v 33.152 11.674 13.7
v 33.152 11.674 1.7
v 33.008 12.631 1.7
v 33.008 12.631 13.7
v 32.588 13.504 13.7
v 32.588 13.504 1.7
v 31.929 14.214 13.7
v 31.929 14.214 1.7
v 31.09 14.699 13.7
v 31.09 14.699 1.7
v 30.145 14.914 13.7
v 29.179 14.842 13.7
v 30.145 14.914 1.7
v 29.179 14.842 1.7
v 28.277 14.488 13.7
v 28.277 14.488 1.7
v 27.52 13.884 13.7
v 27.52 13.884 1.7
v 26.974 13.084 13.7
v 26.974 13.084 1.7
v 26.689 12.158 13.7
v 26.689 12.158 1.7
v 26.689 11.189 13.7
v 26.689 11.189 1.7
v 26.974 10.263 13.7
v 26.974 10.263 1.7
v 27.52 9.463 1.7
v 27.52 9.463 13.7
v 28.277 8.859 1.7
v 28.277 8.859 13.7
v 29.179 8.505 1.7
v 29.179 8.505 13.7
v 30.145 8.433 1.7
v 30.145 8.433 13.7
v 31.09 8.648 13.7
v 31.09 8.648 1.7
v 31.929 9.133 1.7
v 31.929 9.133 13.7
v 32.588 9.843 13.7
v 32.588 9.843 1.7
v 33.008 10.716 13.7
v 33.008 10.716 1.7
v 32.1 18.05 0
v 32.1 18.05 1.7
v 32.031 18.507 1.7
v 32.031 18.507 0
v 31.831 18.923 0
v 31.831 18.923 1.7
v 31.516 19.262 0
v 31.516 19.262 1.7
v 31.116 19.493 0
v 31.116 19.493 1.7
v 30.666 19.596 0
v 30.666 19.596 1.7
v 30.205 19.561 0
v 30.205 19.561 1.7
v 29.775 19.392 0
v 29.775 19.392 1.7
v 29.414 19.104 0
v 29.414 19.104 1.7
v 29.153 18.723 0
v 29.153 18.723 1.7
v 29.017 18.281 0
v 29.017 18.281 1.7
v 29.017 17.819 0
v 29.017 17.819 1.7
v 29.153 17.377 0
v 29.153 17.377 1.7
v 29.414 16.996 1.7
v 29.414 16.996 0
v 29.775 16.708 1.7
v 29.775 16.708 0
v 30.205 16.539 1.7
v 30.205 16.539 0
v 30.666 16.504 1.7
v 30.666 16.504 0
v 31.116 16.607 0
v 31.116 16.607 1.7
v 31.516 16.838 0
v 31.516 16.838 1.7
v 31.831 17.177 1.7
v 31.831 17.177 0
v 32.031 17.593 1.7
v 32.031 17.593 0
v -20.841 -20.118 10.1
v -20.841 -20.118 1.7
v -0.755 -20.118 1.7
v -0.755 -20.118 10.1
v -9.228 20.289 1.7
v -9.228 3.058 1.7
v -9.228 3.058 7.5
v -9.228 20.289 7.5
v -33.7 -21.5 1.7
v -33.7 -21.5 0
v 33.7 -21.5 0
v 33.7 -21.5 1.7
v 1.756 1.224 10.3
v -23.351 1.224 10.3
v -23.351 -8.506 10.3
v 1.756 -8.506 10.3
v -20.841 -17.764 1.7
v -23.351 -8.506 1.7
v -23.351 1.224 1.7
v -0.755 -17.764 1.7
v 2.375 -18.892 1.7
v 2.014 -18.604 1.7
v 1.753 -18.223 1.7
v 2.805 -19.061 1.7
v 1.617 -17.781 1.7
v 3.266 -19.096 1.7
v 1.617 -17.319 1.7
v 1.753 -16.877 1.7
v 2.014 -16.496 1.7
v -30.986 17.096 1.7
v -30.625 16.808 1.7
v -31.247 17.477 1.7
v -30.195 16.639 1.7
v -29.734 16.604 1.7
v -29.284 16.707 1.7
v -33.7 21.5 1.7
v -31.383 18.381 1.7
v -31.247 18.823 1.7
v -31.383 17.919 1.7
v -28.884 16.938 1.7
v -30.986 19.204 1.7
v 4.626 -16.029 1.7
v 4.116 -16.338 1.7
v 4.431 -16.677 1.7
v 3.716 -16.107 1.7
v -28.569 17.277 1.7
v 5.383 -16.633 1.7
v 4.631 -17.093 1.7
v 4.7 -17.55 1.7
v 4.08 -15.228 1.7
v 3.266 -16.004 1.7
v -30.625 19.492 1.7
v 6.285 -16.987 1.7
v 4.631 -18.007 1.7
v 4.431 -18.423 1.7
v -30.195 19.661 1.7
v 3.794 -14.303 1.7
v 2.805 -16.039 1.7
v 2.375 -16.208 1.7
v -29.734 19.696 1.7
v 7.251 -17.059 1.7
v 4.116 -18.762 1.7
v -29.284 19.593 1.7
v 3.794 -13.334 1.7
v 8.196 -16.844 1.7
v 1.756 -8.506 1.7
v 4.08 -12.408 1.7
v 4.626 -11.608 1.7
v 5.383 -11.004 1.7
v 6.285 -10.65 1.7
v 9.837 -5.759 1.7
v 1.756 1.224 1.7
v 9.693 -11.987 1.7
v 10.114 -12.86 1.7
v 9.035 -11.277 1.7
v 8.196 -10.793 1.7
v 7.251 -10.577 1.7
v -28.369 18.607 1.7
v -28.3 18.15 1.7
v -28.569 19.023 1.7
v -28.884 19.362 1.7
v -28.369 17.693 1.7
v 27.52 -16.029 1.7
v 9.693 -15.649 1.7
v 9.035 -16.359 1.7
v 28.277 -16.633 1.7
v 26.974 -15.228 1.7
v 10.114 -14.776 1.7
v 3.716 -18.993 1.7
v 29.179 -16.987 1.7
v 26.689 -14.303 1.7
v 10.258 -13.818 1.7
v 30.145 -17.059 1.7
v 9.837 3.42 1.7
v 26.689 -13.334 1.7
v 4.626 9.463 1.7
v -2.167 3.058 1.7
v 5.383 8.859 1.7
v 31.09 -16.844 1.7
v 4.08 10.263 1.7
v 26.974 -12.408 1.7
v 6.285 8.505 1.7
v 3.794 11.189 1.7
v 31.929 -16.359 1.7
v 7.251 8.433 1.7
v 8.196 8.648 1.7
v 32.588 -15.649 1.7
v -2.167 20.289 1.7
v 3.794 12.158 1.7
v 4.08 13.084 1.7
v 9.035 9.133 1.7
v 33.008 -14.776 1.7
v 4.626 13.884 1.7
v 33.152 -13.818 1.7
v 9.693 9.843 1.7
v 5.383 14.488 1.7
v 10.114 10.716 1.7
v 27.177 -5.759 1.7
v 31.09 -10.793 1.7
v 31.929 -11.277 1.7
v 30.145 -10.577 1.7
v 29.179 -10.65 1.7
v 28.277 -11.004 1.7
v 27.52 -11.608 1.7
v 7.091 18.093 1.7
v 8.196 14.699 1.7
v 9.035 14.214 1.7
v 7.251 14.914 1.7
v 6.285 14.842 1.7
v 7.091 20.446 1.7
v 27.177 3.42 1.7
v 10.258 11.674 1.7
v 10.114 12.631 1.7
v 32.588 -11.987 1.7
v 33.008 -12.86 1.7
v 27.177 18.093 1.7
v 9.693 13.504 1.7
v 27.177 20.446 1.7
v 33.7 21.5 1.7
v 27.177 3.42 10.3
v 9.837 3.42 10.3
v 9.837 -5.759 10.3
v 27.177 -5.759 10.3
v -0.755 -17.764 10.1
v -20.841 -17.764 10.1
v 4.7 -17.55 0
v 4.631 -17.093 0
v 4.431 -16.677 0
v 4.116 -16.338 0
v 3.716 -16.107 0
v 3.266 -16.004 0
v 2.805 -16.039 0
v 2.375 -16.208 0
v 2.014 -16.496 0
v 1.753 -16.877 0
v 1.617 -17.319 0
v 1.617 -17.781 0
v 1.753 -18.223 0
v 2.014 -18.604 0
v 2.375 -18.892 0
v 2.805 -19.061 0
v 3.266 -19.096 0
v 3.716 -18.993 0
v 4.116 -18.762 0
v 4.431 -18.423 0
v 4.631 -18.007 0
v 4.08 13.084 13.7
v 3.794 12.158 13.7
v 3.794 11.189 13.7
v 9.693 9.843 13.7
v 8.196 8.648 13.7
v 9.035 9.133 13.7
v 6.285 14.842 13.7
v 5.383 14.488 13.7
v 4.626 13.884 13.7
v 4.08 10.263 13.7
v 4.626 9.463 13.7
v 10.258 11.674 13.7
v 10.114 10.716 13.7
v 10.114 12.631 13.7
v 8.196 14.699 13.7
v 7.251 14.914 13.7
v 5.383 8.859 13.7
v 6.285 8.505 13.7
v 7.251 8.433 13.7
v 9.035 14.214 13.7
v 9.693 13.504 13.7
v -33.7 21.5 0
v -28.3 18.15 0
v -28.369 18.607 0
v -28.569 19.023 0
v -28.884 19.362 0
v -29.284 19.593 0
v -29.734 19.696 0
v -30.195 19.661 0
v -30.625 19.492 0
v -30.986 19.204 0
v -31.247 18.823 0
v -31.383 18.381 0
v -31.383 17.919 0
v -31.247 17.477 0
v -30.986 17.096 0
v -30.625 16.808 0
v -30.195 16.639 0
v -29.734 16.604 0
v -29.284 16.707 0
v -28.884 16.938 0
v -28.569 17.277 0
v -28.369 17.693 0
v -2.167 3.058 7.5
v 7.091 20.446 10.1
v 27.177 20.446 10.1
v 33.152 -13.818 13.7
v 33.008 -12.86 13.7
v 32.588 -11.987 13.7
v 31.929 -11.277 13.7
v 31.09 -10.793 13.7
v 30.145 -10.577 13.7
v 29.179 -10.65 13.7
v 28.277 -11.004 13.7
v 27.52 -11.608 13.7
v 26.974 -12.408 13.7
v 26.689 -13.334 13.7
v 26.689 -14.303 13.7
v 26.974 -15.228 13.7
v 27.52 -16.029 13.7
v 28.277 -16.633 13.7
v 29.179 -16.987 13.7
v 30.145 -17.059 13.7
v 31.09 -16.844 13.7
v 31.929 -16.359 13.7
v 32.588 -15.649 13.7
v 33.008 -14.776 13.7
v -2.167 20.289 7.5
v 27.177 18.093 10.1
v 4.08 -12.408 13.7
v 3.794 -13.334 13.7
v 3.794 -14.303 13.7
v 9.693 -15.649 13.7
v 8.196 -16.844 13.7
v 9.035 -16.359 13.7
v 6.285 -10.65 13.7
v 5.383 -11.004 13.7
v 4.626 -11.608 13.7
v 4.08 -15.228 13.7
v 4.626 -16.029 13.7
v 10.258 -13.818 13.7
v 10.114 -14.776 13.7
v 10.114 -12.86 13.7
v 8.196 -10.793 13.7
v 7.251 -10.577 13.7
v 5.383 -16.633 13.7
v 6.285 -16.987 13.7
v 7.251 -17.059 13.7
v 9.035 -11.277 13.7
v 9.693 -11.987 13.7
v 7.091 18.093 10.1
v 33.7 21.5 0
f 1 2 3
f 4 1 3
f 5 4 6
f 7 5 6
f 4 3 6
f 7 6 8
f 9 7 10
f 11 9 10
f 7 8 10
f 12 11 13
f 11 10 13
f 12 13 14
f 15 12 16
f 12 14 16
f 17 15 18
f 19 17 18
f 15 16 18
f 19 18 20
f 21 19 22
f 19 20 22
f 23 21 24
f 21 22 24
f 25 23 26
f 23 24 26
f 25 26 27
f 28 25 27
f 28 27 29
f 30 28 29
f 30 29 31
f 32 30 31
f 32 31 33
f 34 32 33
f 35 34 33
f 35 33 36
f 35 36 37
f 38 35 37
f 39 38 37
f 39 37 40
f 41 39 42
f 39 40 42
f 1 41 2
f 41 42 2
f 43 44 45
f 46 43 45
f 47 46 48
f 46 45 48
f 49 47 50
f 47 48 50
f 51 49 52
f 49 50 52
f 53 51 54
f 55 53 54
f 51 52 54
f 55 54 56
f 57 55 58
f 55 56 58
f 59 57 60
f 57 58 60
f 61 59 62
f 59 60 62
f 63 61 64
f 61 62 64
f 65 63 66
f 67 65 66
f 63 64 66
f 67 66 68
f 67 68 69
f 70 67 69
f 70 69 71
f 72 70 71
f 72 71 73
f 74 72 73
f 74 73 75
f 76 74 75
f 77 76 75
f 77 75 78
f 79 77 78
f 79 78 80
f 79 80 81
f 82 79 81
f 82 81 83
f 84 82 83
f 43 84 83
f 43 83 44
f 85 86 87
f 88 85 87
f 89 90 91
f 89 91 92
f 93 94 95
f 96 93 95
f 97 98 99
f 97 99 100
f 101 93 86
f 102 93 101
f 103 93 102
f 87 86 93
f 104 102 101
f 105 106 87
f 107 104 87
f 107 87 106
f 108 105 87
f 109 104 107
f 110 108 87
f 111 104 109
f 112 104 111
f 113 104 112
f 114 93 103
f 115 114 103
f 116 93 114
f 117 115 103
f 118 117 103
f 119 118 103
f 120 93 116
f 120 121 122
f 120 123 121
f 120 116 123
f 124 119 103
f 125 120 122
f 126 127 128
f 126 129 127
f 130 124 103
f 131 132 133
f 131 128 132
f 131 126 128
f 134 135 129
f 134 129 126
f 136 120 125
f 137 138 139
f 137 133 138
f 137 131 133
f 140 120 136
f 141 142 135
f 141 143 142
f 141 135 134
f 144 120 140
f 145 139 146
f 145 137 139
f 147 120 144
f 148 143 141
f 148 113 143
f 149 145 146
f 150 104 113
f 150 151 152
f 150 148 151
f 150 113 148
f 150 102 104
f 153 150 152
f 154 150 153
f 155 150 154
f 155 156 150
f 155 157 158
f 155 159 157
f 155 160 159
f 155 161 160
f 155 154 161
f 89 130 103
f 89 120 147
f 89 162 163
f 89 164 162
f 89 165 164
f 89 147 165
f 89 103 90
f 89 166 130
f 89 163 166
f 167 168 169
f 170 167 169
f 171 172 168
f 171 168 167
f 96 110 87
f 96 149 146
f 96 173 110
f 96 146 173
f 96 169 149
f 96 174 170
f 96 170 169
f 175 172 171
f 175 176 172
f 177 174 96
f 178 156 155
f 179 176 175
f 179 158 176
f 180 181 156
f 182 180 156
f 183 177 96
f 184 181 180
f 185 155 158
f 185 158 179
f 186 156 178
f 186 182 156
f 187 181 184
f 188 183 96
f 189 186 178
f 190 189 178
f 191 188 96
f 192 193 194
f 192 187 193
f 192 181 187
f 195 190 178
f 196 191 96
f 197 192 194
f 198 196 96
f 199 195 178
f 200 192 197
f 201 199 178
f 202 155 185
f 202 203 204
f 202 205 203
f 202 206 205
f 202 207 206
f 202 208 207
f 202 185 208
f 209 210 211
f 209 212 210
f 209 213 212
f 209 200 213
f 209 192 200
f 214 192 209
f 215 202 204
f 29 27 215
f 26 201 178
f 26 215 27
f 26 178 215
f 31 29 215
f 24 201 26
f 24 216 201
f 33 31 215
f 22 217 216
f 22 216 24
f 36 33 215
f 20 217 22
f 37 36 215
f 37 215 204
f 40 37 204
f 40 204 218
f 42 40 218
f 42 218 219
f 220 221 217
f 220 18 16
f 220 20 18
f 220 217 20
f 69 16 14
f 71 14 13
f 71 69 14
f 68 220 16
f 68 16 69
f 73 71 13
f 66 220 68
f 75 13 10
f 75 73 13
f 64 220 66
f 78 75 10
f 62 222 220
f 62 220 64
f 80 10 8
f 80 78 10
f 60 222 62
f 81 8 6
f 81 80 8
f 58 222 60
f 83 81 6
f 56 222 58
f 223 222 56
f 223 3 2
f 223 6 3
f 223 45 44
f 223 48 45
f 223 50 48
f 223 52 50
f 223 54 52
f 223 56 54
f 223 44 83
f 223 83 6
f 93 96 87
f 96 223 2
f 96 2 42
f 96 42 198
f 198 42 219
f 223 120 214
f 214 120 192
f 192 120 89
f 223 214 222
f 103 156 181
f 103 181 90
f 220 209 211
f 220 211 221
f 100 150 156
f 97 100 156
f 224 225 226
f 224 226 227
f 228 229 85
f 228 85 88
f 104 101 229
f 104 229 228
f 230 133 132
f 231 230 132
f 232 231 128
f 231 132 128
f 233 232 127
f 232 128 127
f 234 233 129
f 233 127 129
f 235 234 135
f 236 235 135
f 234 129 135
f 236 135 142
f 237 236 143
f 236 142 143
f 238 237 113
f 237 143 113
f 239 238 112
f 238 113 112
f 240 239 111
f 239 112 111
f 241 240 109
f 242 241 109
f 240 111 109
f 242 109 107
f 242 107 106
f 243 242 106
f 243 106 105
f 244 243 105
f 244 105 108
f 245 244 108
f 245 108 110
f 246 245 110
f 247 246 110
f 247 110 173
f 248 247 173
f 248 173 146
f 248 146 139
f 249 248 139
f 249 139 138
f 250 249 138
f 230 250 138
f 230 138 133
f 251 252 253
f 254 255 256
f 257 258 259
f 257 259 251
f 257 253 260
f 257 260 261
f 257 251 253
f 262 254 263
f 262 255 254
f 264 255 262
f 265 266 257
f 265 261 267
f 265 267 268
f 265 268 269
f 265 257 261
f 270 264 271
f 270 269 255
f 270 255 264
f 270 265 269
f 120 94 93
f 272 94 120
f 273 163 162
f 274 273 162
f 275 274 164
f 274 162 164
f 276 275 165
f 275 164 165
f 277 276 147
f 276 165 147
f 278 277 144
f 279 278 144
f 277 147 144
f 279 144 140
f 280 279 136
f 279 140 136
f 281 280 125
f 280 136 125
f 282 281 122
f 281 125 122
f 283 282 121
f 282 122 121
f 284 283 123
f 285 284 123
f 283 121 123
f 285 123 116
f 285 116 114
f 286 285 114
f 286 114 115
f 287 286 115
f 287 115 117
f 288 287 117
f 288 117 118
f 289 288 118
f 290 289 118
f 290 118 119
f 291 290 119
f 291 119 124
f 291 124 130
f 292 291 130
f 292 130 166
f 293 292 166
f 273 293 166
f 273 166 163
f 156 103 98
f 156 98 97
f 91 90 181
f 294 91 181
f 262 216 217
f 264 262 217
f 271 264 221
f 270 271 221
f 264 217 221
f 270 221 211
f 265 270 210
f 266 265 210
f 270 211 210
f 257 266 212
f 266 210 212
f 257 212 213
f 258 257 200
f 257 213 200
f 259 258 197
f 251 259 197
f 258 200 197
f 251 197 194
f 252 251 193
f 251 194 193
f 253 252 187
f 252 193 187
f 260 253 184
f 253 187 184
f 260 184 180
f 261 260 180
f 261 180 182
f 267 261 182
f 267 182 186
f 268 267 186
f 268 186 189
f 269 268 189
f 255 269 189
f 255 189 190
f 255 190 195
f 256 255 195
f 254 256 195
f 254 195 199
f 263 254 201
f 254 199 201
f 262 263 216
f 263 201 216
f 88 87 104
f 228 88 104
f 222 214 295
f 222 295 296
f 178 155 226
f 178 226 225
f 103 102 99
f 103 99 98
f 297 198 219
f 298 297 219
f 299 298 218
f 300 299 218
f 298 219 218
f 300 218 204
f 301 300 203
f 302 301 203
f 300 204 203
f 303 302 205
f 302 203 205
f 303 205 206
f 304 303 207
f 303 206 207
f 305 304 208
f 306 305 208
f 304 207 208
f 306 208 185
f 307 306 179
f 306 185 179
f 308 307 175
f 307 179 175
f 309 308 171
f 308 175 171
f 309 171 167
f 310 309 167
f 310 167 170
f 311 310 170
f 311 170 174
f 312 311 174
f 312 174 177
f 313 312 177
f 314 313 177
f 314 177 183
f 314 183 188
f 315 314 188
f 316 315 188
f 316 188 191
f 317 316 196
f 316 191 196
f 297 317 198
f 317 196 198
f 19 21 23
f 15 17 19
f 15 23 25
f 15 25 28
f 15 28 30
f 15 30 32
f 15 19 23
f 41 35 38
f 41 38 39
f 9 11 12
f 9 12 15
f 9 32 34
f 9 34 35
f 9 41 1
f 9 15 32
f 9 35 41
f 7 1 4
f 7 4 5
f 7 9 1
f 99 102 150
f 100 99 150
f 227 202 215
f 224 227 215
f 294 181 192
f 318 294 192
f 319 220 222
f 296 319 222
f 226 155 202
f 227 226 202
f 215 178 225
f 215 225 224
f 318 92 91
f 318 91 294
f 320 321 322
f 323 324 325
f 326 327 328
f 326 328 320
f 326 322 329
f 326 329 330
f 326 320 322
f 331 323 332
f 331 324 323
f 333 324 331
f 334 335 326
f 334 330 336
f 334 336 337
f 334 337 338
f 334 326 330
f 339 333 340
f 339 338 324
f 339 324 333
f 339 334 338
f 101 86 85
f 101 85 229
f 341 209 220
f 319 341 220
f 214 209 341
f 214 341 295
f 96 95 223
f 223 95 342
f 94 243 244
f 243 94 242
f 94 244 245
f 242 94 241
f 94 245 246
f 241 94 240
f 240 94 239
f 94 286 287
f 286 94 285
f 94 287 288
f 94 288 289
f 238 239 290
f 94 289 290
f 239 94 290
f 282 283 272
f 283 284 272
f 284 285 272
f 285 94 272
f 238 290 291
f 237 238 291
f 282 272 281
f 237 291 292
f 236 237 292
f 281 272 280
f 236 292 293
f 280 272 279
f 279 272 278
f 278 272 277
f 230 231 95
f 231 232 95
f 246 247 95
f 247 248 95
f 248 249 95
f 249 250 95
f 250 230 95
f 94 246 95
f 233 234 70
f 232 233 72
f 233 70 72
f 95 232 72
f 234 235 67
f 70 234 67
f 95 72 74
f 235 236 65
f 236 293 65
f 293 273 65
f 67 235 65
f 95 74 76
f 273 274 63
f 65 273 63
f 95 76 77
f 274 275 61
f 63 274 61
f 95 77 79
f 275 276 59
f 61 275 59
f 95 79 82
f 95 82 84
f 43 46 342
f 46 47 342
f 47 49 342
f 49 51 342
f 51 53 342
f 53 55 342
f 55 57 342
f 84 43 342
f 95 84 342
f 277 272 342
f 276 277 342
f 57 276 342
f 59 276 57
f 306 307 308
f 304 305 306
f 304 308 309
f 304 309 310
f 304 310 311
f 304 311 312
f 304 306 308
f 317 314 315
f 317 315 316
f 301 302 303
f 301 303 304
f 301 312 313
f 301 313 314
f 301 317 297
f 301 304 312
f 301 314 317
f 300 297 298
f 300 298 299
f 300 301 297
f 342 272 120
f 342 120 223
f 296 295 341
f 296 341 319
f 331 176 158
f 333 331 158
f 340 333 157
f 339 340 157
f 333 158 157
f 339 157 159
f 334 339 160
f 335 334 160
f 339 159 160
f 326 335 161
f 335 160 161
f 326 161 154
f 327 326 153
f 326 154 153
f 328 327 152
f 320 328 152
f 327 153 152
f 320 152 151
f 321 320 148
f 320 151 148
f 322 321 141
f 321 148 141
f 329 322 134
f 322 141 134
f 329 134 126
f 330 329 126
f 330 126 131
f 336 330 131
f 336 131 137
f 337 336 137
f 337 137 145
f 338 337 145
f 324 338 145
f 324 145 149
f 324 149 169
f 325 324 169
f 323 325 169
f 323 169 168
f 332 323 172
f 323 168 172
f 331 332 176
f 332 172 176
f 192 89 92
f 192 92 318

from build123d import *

# Parameters (mm, degrees)
F0_W     = 67.4
F0_H     = 43
F1_DEPTH = 1.7
F2_R     = 1.55
F3_DEPTH = 25
F4_W     = 25.107336
F4_H     = 9.729092
F4_W_2   = 17.339753
F4_H_2   = 9.179869
F5_DEPTH = 8.6
F4_R     = 3.25
F6_DEPTH = 12
F4_W_3   = 20.085868
F4_H_3   = 2.353814
F4_H_4   = 2.353812
F7_DEPTH = 8.4
F4_W_4   = 7.061438
F4_H_5   = 17.231865
F8_DEPTH = 5.8


with BuildPart() as f1:
    # F0 (on Top) → F1 (new body)
    with BuildSketch(Plane.XY):
        Rectangle(F0_W, F0_H)
    extrude(amount=F1_DEPTH)

    # F2 (on face) → F3 (cut)
    with BuildSketch(Plane.XY.offset(1.7)):
        with Locations((-29.85, 18.15)):
            Circle(F2_R)
        with Locations((3.15, -17.55)):
            Circle(F2_R)
        with Locations((30.55, 18.05)):
            Circle(F2_R)
    extrude(amount=-F3_DEPTH, mode=Mode.SUBTRACT)

    # F4 (on face) → F5 (join)
    with BuildSketch(Plane.XY.offset(1.7)):
        with Locations((-10.797692, -3.640961)):
            Rectangle(F4_W, F4_H)
        with Locations((18.507275, -1.169458)):
            Rectangle(F4_W_2, F4_H_2)
    extrude(amount=F5_DEPTH)

    # F4 (on face) → F6 (join)
    with BuildSketch(Plane.XY.offset(1.7)):
        with Locations((7.008187, -13.818246)):
            Circle(F4_R)
        with Locations((7.008187, 11.673535)):
            Circle(F4_R)
        with Locations((29.902235, 11.673535)):
            Circle(F4_R)
        with Locations((29.902235, -13.818246)):
            Circle(F4_R)
    extrude(amount=F6_DEPTH)

    # F4 (on face) → F7 (join)
    with BuildSketch(Plane.XY.offset(1.7)):
        with Locations((-10.797692, -18.940743)):
            Rectangle(F4_W_3, F4_H_3)
        with Locations((17.134217, 19.269482)):
            Rectangle(F4_W_3, F4_H_4)
    extrude(amount=F7_DEPTH)

    # F4 (on face) → F8 (join)
    with BuildSketch(Plane.XY.offset(1.7)):
        with Locations((-5.697765, 11.673535)):
            Rectangle(F4_W_4, F4_H_5)
    extrude(amount=F8_DEPTH)


solid = f1.part
